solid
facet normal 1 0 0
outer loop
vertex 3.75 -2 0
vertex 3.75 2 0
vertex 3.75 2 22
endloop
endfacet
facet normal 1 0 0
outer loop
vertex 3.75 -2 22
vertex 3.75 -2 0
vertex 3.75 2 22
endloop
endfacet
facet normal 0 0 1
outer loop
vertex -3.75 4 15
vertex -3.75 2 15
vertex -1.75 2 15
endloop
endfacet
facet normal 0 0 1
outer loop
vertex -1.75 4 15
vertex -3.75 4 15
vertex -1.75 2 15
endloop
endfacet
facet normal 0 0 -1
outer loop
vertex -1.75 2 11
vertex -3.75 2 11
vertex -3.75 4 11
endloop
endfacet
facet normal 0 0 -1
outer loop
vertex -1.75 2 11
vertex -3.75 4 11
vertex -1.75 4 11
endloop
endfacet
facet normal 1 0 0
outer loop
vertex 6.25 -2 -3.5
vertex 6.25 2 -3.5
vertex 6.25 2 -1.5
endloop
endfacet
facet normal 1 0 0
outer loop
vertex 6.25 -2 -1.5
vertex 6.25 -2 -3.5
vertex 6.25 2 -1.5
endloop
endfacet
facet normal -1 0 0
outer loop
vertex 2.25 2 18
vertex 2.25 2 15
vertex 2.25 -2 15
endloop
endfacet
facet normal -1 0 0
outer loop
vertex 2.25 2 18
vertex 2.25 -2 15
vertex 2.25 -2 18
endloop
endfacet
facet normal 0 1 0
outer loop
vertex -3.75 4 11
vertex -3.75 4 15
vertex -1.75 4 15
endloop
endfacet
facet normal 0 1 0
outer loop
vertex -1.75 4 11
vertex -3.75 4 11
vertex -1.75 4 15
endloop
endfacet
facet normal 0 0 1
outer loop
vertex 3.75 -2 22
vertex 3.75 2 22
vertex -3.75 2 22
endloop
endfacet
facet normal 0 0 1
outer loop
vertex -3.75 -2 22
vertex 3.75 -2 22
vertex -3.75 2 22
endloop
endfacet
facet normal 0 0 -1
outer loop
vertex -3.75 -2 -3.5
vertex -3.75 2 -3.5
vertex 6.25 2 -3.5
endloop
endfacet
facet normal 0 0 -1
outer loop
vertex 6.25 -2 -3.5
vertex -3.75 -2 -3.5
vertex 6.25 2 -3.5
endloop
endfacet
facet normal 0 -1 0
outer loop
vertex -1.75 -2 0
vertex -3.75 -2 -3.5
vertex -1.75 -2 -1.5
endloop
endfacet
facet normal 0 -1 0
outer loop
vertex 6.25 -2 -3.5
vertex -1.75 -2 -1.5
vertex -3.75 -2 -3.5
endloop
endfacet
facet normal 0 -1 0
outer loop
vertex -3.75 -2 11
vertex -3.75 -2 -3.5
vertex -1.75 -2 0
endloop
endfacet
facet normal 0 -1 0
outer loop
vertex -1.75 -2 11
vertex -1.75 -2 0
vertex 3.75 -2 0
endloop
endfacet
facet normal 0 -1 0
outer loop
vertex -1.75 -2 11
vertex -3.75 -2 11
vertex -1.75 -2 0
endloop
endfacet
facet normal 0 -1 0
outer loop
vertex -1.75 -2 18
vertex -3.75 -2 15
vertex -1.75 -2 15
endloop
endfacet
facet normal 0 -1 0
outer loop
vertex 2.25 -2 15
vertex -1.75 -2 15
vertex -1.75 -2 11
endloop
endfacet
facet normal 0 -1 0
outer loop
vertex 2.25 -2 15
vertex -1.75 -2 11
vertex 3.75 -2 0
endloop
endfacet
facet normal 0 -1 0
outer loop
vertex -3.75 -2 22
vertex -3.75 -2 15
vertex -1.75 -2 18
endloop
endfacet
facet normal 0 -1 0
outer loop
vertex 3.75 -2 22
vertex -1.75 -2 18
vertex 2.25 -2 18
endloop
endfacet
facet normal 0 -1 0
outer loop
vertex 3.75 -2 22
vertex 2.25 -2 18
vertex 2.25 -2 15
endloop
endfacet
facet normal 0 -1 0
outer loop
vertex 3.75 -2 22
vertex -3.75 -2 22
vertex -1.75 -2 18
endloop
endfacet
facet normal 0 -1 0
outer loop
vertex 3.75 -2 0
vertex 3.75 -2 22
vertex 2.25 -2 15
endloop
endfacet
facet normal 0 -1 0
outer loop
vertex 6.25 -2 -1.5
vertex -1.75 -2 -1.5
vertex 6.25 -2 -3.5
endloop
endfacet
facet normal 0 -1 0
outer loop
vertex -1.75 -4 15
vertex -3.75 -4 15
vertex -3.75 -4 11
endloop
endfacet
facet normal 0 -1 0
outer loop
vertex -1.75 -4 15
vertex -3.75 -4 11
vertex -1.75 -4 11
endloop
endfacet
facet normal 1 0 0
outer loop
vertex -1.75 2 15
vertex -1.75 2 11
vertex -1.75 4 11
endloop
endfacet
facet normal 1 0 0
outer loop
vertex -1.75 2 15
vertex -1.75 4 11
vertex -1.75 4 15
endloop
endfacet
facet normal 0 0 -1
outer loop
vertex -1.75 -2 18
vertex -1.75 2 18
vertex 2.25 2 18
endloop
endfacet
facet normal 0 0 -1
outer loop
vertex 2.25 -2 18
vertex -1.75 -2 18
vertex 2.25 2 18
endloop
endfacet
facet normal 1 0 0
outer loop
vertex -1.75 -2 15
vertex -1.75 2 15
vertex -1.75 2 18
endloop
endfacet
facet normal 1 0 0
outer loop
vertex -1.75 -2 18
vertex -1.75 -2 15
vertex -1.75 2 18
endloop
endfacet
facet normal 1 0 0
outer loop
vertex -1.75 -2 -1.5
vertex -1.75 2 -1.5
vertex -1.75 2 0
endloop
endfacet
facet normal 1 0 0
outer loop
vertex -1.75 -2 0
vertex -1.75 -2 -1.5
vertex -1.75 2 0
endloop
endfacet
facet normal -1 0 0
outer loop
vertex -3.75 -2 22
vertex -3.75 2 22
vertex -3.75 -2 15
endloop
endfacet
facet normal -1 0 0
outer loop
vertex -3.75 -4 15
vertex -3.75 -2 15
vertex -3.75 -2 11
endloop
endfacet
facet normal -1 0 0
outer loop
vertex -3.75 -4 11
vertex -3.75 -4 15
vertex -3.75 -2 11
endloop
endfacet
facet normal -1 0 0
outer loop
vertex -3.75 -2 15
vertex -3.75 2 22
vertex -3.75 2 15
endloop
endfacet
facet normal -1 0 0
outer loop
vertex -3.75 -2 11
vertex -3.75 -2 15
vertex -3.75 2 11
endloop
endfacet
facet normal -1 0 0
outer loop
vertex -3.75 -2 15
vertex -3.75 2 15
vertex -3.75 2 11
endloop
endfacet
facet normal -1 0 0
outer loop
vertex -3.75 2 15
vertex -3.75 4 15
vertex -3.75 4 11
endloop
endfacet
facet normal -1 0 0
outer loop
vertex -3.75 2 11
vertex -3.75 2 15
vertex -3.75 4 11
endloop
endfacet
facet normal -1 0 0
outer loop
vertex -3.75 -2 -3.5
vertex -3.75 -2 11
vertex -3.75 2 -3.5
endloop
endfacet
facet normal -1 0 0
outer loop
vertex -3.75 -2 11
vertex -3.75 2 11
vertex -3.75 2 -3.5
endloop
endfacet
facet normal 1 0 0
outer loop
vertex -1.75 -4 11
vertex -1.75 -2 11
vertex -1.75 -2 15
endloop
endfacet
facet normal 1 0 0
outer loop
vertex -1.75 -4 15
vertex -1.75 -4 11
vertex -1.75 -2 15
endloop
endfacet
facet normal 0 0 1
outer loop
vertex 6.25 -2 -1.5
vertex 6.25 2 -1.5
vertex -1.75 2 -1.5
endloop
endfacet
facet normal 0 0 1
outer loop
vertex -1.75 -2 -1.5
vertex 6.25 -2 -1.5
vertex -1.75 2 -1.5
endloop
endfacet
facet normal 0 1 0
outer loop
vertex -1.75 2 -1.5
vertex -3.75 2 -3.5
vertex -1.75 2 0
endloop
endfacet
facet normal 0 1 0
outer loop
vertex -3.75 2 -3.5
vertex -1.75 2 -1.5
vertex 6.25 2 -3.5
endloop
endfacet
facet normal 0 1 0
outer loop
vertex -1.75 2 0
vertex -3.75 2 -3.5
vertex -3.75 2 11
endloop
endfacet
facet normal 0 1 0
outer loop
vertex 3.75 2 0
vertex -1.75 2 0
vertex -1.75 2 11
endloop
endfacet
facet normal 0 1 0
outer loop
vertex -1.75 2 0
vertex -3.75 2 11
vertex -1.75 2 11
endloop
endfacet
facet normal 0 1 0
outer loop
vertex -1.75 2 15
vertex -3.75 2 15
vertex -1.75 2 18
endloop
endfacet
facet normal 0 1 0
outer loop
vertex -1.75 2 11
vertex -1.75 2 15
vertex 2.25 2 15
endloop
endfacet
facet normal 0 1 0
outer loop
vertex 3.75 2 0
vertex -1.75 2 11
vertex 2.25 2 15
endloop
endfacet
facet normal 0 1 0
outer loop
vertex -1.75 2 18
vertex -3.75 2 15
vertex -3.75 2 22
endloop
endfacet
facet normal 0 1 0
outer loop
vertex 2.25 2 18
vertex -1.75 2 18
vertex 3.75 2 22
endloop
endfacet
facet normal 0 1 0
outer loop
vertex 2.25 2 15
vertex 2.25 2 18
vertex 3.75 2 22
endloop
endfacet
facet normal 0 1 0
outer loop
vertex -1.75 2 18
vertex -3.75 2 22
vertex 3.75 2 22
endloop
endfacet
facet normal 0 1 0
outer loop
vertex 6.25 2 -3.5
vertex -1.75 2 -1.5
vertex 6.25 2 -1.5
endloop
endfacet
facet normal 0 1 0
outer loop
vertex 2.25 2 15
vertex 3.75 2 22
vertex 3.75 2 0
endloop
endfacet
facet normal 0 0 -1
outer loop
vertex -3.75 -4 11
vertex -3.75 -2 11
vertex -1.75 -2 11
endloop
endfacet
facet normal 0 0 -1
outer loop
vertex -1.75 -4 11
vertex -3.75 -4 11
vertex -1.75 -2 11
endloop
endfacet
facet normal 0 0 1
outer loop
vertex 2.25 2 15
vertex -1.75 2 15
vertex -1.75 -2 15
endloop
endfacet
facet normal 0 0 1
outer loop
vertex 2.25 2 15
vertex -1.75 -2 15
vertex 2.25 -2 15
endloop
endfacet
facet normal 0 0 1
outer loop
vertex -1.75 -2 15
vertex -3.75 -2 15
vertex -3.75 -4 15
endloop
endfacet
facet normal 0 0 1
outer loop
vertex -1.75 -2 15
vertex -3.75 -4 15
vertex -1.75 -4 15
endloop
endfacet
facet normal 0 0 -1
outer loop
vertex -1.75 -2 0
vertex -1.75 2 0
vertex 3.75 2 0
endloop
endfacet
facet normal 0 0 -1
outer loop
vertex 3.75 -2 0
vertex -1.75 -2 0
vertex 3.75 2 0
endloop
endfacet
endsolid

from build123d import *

# Parameters (mm, degrees)
SKETCH002_W  = 4
SKETCH002_H  = 3
PAD002_DEPTH = 4
SKETCH_W     = 2
SKETCH_H     = 4
PAD_DEPTH    = 6


with BuildPart() as part:
    # Sketch002 → Pad002 (new body)
    with BuildSketch(Plane.XZ.offset(-2)):
        Polygon((3.75, 0), (3.75, 22), (3.75, 22), (2.25, 22), (-3.75, 22), (-3.75, 0), (-3.75, -3.5), (6.25, -3.5), (6.25, -1.5), (-1.75, -1.5), (-1.75, 0), align=None)
        with Locations((0.25, 16.5)):
            Rectangle(SKETCH002_W, SKETCH002_H, mode=Mode.SUBTRACT)
    extrude(amount=PAD002_DEPTH)

    # Sketch (on Pad) → Pad (join)
    with BuildSketch(Plane.XZ.offset(-2)):
        with Locations((-2.75, 13)):
            Rectangle(SKETCH_W, SKETCH_H)
    pad = extrude(amount=PAD_DEPTH)

    # Mirrored: Pad across XZ
    add(pad.mirror(Plane.XZ))


solid = part.part
